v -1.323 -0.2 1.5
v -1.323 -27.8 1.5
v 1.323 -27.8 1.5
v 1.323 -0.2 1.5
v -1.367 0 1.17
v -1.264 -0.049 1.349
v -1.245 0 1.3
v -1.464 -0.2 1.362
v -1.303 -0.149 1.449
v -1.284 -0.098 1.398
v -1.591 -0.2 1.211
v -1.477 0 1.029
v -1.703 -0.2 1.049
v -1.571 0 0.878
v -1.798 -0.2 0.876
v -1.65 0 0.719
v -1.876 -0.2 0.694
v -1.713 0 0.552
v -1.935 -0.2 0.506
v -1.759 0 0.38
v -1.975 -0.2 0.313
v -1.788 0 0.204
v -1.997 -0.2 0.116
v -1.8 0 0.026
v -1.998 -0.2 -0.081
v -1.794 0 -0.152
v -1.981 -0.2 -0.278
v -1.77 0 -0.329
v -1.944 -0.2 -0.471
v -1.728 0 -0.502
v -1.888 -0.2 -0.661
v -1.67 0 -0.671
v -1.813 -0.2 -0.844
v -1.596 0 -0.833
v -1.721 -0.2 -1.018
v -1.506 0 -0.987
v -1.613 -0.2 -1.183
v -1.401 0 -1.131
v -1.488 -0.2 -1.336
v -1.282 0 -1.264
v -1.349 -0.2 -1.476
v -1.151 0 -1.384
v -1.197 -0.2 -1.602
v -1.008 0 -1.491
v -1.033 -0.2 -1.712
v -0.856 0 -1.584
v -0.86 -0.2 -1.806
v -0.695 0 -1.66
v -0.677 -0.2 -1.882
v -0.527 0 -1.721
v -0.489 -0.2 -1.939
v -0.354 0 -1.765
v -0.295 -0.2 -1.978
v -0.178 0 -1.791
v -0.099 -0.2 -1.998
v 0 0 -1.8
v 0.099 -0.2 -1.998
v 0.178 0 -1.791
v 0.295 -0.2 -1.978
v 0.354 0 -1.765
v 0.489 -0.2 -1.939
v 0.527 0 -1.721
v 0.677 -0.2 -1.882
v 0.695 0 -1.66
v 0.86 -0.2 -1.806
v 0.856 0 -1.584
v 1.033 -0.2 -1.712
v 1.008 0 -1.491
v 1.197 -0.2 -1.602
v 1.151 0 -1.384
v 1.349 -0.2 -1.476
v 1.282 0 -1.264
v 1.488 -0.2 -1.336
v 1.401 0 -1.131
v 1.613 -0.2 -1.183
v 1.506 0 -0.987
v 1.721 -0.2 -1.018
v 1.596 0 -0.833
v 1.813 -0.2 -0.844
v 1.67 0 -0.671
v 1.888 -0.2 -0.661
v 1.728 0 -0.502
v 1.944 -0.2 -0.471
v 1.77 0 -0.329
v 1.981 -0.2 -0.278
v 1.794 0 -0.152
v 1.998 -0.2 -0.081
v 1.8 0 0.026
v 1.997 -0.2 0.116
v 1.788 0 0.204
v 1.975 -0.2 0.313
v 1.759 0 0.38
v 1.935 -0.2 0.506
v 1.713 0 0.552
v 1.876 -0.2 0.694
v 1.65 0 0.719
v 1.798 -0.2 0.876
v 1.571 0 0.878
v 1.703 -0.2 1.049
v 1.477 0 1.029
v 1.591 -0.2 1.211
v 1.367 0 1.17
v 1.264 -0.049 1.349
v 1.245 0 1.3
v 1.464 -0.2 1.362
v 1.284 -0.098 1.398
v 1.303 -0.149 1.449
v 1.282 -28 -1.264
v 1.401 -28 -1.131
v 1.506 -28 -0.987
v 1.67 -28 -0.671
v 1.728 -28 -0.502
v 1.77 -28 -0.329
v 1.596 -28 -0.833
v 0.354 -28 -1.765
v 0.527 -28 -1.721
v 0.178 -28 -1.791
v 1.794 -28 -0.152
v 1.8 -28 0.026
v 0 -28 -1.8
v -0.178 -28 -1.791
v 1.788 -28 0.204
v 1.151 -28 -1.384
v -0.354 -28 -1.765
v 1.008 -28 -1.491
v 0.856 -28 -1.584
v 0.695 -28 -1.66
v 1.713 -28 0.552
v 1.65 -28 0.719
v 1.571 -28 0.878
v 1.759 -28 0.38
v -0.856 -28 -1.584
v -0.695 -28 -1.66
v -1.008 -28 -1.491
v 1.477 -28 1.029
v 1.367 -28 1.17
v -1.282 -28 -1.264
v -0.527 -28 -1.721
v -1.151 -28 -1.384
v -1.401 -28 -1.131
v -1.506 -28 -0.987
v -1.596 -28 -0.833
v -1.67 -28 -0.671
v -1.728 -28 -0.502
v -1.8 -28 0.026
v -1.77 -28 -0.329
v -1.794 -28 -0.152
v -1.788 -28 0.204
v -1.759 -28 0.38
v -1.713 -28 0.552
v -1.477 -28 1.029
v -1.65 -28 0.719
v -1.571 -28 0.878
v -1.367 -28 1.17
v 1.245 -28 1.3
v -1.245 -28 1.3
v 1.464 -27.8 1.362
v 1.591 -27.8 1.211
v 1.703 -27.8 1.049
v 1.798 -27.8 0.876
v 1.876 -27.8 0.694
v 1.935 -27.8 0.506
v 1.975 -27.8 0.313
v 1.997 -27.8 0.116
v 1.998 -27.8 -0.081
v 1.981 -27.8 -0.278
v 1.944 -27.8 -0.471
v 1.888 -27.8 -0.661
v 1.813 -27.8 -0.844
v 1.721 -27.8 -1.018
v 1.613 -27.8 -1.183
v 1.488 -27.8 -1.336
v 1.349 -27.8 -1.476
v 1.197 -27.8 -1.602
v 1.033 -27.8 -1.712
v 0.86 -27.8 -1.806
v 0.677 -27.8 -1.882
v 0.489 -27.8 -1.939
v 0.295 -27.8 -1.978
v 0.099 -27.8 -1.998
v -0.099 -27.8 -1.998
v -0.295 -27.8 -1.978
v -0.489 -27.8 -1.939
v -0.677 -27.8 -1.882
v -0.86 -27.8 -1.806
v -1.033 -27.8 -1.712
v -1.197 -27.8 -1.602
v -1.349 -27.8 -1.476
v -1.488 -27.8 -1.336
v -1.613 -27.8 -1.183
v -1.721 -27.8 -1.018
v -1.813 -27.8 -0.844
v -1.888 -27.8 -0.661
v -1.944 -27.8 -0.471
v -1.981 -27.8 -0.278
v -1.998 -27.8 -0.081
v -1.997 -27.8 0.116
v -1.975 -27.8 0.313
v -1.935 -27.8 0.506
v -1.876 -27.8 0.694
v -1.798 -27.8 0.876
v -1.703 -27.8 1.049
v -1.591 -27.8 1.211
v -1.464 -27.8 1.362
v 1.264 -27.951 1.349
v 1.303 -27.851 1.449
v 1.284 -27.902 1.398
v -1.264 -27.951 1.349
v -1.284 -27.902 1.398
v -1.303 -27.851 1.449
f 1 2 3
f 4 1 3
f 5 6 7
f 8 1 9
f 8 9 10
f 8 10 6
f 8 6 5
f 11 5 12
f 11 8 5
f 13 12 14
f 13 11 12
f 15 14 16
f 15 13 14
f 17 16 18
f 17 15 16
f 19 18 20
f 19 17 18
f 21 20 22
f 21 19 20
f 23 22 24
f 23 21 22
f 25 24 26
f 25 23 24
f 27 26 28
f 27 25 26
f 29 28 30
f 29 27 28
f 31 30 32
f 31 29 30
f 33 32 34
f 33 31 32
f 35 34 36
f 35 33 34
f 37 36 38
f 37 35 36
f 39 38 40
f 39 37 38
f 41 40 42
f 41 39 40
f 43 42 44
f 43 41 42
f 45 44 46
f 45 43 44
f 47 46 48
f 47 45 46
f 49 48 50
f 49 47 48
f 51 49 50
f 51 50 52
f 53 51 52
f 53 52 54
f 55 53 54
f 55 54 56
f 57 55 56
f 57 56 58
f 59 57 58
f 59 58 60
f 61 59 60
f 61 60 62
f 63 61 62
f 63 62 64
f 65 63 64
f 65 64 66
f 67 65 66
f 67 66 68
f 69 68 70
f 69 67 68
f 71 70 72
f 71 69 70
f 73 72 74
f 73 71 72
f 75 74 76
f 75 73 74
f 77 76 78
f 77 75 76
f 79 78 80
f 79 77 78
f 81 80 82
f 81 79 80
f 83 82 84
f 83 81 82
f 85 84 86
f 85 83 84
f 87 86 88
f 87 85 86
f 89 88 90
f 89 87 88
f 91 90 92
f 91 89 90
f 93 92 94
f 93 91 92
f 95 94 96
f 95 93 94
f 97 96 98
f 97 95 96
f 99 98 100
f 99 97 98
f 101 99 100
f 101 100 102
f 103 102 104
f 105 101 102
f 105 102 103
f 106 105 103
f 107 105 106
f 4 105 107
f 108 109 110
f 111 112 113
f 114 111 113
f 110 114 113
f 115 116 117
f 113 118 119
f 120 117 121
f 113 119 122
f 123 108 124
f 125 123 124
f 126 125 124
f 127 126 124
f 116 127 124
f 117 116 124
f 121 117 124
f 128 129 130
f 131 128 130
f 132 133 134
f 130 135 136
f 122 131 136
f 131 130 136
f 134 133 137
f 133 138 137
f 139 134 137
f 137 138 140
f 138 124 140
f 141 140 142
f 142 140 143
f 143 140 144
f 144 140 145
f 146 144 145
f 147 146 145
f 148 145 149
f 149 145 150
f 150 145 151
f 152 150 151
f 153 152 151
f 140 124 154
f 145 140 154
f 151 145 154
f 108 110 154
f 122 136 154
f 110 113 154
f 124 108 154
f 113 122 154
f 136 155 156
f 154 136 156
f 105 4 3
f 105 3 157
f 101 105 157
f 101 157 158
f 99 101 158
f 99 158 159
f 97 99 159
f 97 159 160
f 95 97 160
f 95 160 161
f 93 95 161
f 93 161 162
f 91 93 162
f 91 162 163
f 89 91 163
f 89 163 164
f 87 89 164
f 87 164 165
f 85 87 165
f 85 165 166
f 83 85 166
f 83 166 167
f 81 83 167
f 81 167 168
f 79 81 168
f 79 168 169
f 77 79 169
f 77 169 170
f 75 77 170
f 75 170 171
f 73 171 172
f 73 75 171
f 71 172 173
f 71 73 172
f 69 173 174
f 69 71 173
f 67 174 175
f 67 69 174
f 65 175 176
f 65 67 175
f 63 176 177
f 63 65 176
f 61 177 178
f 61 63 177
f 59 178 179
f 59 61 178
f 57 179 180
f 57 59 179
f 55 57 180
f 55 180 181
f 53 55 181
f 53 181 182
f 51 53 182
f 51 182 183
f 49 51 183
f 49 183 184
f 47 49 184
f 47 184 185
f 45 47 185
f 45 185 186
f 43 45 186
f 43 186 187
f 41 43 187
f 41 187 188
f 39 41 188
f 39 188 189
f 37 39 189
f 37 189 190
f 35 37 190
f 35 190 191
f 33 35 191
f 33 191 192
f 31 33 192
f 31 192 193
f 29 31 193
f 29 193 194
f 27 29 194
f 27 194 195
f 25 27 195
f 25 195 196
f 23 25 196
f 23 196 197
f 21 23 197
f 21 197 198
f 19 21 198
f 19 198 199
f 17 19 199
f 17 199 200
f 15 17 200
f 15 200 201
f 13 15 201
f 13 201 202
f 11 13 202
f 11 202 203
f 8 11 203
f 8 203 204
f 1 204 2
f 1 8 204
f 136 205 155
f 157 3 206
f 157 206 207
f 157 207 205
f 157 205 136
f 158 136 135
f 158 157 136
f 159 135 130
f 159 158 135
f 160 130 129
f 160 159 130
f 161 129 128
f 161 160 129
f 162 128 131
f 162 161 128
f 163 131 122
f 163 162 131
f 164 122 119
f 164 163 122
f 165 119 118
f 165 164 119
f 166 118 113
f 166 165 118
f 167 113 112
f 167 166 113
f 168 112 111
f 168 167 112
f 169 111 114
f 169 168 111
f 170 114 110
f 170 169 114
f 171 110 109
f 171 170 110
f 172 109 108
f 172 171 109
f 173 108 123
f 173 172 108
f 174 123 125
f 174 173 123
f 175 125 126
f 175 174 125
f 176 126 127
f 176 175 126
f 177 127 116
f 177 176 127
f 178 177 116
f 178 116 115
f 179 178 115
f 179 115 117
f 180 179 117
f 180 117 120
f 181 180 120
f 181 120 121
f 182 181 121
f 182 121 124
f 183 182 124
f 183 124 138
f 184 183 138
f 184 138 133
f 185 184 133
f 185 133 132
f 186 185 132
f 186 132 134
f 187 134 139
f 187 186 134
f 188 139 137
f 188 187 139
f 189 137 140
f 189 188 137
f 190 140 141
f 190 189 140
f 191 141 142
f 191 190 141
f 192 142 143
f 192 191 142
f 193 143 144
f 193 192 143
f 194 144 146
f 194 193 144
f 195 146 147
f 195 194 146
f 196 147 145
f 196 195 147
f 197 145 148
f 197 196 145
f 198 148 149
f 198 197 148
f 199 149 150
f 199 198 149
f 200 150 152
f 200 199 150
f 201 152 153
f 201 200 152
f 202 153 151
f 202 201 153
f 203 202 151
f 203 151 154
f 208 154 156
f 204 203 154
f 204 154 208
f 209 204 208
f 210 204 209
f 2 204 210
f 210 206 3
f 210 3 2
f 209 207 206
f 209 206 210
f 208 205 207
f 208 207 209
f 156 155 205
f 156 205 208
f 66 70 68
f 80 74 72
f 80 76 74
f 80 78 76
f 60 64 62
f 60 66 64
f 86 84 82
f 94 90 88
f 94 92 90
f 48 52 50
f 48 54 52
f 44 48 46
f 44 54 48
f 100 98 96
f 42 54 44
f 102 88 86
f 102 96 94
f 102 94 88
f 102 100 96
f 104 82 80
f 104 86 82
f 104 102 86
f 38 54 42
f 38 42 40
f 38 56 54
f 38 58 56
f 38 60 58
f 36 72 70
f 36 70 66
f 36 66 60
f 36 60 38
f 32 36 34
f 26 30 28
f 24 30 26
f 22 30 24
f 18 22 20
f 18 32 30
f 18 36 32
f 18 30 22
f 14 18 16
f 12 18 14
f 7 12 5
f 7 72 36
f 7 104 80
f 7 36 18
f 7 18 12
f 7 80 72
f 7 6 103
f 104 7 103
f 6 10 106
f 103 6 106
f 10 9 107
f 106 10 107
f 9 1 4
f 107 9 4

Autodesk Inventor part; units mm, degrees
ref_plane "YZ Plane" through (0, 0, 0) normal (1, 0, 0) x (0, 1, 0)
ref_plane "XZ Plane" through (0, 0, 0) normal (0, 1, 0) x (-1, 0, 0)
ref_plane "XY Plane" through (0, 0, 0) normal (0, 0, 1) x (1, 0, 0)
sketch "Sketch1" plane through (0, 0, 0) normal (0, 1, 0) x (-1, 0, 0)
  circle A0 centre (0, 0) radius 2
  dimension "d0" = 4
extrude "Extrusion1" add sketch "Sketch1" against normal blind 28
sketch "Sketch2" plane through (0, -28, 0) normal (0, -1, 0) x (1, 0, 0)
  circle A0 centre (0, 0) radius 2 projected
  line L0 (-1.3229, 1.5) -> (1.3229, 1.5)
  circle A1 centre (0, 0) radius 2 projected
  dimension "d3" = 0.5
extrude "Extrusion2" cut sketch "Sketch2" against normal through all contours L0 A0 picked at (-0.3089, 1.5908)
chamfer "Chamfer1" distance 0.2 angle 45 4 edges at (0, -28, -2) (0, -28, 1.5) (0, 0, -2) (0, 0, 1.5)
properties part number "10-0028" material "Aluminum 6061"
